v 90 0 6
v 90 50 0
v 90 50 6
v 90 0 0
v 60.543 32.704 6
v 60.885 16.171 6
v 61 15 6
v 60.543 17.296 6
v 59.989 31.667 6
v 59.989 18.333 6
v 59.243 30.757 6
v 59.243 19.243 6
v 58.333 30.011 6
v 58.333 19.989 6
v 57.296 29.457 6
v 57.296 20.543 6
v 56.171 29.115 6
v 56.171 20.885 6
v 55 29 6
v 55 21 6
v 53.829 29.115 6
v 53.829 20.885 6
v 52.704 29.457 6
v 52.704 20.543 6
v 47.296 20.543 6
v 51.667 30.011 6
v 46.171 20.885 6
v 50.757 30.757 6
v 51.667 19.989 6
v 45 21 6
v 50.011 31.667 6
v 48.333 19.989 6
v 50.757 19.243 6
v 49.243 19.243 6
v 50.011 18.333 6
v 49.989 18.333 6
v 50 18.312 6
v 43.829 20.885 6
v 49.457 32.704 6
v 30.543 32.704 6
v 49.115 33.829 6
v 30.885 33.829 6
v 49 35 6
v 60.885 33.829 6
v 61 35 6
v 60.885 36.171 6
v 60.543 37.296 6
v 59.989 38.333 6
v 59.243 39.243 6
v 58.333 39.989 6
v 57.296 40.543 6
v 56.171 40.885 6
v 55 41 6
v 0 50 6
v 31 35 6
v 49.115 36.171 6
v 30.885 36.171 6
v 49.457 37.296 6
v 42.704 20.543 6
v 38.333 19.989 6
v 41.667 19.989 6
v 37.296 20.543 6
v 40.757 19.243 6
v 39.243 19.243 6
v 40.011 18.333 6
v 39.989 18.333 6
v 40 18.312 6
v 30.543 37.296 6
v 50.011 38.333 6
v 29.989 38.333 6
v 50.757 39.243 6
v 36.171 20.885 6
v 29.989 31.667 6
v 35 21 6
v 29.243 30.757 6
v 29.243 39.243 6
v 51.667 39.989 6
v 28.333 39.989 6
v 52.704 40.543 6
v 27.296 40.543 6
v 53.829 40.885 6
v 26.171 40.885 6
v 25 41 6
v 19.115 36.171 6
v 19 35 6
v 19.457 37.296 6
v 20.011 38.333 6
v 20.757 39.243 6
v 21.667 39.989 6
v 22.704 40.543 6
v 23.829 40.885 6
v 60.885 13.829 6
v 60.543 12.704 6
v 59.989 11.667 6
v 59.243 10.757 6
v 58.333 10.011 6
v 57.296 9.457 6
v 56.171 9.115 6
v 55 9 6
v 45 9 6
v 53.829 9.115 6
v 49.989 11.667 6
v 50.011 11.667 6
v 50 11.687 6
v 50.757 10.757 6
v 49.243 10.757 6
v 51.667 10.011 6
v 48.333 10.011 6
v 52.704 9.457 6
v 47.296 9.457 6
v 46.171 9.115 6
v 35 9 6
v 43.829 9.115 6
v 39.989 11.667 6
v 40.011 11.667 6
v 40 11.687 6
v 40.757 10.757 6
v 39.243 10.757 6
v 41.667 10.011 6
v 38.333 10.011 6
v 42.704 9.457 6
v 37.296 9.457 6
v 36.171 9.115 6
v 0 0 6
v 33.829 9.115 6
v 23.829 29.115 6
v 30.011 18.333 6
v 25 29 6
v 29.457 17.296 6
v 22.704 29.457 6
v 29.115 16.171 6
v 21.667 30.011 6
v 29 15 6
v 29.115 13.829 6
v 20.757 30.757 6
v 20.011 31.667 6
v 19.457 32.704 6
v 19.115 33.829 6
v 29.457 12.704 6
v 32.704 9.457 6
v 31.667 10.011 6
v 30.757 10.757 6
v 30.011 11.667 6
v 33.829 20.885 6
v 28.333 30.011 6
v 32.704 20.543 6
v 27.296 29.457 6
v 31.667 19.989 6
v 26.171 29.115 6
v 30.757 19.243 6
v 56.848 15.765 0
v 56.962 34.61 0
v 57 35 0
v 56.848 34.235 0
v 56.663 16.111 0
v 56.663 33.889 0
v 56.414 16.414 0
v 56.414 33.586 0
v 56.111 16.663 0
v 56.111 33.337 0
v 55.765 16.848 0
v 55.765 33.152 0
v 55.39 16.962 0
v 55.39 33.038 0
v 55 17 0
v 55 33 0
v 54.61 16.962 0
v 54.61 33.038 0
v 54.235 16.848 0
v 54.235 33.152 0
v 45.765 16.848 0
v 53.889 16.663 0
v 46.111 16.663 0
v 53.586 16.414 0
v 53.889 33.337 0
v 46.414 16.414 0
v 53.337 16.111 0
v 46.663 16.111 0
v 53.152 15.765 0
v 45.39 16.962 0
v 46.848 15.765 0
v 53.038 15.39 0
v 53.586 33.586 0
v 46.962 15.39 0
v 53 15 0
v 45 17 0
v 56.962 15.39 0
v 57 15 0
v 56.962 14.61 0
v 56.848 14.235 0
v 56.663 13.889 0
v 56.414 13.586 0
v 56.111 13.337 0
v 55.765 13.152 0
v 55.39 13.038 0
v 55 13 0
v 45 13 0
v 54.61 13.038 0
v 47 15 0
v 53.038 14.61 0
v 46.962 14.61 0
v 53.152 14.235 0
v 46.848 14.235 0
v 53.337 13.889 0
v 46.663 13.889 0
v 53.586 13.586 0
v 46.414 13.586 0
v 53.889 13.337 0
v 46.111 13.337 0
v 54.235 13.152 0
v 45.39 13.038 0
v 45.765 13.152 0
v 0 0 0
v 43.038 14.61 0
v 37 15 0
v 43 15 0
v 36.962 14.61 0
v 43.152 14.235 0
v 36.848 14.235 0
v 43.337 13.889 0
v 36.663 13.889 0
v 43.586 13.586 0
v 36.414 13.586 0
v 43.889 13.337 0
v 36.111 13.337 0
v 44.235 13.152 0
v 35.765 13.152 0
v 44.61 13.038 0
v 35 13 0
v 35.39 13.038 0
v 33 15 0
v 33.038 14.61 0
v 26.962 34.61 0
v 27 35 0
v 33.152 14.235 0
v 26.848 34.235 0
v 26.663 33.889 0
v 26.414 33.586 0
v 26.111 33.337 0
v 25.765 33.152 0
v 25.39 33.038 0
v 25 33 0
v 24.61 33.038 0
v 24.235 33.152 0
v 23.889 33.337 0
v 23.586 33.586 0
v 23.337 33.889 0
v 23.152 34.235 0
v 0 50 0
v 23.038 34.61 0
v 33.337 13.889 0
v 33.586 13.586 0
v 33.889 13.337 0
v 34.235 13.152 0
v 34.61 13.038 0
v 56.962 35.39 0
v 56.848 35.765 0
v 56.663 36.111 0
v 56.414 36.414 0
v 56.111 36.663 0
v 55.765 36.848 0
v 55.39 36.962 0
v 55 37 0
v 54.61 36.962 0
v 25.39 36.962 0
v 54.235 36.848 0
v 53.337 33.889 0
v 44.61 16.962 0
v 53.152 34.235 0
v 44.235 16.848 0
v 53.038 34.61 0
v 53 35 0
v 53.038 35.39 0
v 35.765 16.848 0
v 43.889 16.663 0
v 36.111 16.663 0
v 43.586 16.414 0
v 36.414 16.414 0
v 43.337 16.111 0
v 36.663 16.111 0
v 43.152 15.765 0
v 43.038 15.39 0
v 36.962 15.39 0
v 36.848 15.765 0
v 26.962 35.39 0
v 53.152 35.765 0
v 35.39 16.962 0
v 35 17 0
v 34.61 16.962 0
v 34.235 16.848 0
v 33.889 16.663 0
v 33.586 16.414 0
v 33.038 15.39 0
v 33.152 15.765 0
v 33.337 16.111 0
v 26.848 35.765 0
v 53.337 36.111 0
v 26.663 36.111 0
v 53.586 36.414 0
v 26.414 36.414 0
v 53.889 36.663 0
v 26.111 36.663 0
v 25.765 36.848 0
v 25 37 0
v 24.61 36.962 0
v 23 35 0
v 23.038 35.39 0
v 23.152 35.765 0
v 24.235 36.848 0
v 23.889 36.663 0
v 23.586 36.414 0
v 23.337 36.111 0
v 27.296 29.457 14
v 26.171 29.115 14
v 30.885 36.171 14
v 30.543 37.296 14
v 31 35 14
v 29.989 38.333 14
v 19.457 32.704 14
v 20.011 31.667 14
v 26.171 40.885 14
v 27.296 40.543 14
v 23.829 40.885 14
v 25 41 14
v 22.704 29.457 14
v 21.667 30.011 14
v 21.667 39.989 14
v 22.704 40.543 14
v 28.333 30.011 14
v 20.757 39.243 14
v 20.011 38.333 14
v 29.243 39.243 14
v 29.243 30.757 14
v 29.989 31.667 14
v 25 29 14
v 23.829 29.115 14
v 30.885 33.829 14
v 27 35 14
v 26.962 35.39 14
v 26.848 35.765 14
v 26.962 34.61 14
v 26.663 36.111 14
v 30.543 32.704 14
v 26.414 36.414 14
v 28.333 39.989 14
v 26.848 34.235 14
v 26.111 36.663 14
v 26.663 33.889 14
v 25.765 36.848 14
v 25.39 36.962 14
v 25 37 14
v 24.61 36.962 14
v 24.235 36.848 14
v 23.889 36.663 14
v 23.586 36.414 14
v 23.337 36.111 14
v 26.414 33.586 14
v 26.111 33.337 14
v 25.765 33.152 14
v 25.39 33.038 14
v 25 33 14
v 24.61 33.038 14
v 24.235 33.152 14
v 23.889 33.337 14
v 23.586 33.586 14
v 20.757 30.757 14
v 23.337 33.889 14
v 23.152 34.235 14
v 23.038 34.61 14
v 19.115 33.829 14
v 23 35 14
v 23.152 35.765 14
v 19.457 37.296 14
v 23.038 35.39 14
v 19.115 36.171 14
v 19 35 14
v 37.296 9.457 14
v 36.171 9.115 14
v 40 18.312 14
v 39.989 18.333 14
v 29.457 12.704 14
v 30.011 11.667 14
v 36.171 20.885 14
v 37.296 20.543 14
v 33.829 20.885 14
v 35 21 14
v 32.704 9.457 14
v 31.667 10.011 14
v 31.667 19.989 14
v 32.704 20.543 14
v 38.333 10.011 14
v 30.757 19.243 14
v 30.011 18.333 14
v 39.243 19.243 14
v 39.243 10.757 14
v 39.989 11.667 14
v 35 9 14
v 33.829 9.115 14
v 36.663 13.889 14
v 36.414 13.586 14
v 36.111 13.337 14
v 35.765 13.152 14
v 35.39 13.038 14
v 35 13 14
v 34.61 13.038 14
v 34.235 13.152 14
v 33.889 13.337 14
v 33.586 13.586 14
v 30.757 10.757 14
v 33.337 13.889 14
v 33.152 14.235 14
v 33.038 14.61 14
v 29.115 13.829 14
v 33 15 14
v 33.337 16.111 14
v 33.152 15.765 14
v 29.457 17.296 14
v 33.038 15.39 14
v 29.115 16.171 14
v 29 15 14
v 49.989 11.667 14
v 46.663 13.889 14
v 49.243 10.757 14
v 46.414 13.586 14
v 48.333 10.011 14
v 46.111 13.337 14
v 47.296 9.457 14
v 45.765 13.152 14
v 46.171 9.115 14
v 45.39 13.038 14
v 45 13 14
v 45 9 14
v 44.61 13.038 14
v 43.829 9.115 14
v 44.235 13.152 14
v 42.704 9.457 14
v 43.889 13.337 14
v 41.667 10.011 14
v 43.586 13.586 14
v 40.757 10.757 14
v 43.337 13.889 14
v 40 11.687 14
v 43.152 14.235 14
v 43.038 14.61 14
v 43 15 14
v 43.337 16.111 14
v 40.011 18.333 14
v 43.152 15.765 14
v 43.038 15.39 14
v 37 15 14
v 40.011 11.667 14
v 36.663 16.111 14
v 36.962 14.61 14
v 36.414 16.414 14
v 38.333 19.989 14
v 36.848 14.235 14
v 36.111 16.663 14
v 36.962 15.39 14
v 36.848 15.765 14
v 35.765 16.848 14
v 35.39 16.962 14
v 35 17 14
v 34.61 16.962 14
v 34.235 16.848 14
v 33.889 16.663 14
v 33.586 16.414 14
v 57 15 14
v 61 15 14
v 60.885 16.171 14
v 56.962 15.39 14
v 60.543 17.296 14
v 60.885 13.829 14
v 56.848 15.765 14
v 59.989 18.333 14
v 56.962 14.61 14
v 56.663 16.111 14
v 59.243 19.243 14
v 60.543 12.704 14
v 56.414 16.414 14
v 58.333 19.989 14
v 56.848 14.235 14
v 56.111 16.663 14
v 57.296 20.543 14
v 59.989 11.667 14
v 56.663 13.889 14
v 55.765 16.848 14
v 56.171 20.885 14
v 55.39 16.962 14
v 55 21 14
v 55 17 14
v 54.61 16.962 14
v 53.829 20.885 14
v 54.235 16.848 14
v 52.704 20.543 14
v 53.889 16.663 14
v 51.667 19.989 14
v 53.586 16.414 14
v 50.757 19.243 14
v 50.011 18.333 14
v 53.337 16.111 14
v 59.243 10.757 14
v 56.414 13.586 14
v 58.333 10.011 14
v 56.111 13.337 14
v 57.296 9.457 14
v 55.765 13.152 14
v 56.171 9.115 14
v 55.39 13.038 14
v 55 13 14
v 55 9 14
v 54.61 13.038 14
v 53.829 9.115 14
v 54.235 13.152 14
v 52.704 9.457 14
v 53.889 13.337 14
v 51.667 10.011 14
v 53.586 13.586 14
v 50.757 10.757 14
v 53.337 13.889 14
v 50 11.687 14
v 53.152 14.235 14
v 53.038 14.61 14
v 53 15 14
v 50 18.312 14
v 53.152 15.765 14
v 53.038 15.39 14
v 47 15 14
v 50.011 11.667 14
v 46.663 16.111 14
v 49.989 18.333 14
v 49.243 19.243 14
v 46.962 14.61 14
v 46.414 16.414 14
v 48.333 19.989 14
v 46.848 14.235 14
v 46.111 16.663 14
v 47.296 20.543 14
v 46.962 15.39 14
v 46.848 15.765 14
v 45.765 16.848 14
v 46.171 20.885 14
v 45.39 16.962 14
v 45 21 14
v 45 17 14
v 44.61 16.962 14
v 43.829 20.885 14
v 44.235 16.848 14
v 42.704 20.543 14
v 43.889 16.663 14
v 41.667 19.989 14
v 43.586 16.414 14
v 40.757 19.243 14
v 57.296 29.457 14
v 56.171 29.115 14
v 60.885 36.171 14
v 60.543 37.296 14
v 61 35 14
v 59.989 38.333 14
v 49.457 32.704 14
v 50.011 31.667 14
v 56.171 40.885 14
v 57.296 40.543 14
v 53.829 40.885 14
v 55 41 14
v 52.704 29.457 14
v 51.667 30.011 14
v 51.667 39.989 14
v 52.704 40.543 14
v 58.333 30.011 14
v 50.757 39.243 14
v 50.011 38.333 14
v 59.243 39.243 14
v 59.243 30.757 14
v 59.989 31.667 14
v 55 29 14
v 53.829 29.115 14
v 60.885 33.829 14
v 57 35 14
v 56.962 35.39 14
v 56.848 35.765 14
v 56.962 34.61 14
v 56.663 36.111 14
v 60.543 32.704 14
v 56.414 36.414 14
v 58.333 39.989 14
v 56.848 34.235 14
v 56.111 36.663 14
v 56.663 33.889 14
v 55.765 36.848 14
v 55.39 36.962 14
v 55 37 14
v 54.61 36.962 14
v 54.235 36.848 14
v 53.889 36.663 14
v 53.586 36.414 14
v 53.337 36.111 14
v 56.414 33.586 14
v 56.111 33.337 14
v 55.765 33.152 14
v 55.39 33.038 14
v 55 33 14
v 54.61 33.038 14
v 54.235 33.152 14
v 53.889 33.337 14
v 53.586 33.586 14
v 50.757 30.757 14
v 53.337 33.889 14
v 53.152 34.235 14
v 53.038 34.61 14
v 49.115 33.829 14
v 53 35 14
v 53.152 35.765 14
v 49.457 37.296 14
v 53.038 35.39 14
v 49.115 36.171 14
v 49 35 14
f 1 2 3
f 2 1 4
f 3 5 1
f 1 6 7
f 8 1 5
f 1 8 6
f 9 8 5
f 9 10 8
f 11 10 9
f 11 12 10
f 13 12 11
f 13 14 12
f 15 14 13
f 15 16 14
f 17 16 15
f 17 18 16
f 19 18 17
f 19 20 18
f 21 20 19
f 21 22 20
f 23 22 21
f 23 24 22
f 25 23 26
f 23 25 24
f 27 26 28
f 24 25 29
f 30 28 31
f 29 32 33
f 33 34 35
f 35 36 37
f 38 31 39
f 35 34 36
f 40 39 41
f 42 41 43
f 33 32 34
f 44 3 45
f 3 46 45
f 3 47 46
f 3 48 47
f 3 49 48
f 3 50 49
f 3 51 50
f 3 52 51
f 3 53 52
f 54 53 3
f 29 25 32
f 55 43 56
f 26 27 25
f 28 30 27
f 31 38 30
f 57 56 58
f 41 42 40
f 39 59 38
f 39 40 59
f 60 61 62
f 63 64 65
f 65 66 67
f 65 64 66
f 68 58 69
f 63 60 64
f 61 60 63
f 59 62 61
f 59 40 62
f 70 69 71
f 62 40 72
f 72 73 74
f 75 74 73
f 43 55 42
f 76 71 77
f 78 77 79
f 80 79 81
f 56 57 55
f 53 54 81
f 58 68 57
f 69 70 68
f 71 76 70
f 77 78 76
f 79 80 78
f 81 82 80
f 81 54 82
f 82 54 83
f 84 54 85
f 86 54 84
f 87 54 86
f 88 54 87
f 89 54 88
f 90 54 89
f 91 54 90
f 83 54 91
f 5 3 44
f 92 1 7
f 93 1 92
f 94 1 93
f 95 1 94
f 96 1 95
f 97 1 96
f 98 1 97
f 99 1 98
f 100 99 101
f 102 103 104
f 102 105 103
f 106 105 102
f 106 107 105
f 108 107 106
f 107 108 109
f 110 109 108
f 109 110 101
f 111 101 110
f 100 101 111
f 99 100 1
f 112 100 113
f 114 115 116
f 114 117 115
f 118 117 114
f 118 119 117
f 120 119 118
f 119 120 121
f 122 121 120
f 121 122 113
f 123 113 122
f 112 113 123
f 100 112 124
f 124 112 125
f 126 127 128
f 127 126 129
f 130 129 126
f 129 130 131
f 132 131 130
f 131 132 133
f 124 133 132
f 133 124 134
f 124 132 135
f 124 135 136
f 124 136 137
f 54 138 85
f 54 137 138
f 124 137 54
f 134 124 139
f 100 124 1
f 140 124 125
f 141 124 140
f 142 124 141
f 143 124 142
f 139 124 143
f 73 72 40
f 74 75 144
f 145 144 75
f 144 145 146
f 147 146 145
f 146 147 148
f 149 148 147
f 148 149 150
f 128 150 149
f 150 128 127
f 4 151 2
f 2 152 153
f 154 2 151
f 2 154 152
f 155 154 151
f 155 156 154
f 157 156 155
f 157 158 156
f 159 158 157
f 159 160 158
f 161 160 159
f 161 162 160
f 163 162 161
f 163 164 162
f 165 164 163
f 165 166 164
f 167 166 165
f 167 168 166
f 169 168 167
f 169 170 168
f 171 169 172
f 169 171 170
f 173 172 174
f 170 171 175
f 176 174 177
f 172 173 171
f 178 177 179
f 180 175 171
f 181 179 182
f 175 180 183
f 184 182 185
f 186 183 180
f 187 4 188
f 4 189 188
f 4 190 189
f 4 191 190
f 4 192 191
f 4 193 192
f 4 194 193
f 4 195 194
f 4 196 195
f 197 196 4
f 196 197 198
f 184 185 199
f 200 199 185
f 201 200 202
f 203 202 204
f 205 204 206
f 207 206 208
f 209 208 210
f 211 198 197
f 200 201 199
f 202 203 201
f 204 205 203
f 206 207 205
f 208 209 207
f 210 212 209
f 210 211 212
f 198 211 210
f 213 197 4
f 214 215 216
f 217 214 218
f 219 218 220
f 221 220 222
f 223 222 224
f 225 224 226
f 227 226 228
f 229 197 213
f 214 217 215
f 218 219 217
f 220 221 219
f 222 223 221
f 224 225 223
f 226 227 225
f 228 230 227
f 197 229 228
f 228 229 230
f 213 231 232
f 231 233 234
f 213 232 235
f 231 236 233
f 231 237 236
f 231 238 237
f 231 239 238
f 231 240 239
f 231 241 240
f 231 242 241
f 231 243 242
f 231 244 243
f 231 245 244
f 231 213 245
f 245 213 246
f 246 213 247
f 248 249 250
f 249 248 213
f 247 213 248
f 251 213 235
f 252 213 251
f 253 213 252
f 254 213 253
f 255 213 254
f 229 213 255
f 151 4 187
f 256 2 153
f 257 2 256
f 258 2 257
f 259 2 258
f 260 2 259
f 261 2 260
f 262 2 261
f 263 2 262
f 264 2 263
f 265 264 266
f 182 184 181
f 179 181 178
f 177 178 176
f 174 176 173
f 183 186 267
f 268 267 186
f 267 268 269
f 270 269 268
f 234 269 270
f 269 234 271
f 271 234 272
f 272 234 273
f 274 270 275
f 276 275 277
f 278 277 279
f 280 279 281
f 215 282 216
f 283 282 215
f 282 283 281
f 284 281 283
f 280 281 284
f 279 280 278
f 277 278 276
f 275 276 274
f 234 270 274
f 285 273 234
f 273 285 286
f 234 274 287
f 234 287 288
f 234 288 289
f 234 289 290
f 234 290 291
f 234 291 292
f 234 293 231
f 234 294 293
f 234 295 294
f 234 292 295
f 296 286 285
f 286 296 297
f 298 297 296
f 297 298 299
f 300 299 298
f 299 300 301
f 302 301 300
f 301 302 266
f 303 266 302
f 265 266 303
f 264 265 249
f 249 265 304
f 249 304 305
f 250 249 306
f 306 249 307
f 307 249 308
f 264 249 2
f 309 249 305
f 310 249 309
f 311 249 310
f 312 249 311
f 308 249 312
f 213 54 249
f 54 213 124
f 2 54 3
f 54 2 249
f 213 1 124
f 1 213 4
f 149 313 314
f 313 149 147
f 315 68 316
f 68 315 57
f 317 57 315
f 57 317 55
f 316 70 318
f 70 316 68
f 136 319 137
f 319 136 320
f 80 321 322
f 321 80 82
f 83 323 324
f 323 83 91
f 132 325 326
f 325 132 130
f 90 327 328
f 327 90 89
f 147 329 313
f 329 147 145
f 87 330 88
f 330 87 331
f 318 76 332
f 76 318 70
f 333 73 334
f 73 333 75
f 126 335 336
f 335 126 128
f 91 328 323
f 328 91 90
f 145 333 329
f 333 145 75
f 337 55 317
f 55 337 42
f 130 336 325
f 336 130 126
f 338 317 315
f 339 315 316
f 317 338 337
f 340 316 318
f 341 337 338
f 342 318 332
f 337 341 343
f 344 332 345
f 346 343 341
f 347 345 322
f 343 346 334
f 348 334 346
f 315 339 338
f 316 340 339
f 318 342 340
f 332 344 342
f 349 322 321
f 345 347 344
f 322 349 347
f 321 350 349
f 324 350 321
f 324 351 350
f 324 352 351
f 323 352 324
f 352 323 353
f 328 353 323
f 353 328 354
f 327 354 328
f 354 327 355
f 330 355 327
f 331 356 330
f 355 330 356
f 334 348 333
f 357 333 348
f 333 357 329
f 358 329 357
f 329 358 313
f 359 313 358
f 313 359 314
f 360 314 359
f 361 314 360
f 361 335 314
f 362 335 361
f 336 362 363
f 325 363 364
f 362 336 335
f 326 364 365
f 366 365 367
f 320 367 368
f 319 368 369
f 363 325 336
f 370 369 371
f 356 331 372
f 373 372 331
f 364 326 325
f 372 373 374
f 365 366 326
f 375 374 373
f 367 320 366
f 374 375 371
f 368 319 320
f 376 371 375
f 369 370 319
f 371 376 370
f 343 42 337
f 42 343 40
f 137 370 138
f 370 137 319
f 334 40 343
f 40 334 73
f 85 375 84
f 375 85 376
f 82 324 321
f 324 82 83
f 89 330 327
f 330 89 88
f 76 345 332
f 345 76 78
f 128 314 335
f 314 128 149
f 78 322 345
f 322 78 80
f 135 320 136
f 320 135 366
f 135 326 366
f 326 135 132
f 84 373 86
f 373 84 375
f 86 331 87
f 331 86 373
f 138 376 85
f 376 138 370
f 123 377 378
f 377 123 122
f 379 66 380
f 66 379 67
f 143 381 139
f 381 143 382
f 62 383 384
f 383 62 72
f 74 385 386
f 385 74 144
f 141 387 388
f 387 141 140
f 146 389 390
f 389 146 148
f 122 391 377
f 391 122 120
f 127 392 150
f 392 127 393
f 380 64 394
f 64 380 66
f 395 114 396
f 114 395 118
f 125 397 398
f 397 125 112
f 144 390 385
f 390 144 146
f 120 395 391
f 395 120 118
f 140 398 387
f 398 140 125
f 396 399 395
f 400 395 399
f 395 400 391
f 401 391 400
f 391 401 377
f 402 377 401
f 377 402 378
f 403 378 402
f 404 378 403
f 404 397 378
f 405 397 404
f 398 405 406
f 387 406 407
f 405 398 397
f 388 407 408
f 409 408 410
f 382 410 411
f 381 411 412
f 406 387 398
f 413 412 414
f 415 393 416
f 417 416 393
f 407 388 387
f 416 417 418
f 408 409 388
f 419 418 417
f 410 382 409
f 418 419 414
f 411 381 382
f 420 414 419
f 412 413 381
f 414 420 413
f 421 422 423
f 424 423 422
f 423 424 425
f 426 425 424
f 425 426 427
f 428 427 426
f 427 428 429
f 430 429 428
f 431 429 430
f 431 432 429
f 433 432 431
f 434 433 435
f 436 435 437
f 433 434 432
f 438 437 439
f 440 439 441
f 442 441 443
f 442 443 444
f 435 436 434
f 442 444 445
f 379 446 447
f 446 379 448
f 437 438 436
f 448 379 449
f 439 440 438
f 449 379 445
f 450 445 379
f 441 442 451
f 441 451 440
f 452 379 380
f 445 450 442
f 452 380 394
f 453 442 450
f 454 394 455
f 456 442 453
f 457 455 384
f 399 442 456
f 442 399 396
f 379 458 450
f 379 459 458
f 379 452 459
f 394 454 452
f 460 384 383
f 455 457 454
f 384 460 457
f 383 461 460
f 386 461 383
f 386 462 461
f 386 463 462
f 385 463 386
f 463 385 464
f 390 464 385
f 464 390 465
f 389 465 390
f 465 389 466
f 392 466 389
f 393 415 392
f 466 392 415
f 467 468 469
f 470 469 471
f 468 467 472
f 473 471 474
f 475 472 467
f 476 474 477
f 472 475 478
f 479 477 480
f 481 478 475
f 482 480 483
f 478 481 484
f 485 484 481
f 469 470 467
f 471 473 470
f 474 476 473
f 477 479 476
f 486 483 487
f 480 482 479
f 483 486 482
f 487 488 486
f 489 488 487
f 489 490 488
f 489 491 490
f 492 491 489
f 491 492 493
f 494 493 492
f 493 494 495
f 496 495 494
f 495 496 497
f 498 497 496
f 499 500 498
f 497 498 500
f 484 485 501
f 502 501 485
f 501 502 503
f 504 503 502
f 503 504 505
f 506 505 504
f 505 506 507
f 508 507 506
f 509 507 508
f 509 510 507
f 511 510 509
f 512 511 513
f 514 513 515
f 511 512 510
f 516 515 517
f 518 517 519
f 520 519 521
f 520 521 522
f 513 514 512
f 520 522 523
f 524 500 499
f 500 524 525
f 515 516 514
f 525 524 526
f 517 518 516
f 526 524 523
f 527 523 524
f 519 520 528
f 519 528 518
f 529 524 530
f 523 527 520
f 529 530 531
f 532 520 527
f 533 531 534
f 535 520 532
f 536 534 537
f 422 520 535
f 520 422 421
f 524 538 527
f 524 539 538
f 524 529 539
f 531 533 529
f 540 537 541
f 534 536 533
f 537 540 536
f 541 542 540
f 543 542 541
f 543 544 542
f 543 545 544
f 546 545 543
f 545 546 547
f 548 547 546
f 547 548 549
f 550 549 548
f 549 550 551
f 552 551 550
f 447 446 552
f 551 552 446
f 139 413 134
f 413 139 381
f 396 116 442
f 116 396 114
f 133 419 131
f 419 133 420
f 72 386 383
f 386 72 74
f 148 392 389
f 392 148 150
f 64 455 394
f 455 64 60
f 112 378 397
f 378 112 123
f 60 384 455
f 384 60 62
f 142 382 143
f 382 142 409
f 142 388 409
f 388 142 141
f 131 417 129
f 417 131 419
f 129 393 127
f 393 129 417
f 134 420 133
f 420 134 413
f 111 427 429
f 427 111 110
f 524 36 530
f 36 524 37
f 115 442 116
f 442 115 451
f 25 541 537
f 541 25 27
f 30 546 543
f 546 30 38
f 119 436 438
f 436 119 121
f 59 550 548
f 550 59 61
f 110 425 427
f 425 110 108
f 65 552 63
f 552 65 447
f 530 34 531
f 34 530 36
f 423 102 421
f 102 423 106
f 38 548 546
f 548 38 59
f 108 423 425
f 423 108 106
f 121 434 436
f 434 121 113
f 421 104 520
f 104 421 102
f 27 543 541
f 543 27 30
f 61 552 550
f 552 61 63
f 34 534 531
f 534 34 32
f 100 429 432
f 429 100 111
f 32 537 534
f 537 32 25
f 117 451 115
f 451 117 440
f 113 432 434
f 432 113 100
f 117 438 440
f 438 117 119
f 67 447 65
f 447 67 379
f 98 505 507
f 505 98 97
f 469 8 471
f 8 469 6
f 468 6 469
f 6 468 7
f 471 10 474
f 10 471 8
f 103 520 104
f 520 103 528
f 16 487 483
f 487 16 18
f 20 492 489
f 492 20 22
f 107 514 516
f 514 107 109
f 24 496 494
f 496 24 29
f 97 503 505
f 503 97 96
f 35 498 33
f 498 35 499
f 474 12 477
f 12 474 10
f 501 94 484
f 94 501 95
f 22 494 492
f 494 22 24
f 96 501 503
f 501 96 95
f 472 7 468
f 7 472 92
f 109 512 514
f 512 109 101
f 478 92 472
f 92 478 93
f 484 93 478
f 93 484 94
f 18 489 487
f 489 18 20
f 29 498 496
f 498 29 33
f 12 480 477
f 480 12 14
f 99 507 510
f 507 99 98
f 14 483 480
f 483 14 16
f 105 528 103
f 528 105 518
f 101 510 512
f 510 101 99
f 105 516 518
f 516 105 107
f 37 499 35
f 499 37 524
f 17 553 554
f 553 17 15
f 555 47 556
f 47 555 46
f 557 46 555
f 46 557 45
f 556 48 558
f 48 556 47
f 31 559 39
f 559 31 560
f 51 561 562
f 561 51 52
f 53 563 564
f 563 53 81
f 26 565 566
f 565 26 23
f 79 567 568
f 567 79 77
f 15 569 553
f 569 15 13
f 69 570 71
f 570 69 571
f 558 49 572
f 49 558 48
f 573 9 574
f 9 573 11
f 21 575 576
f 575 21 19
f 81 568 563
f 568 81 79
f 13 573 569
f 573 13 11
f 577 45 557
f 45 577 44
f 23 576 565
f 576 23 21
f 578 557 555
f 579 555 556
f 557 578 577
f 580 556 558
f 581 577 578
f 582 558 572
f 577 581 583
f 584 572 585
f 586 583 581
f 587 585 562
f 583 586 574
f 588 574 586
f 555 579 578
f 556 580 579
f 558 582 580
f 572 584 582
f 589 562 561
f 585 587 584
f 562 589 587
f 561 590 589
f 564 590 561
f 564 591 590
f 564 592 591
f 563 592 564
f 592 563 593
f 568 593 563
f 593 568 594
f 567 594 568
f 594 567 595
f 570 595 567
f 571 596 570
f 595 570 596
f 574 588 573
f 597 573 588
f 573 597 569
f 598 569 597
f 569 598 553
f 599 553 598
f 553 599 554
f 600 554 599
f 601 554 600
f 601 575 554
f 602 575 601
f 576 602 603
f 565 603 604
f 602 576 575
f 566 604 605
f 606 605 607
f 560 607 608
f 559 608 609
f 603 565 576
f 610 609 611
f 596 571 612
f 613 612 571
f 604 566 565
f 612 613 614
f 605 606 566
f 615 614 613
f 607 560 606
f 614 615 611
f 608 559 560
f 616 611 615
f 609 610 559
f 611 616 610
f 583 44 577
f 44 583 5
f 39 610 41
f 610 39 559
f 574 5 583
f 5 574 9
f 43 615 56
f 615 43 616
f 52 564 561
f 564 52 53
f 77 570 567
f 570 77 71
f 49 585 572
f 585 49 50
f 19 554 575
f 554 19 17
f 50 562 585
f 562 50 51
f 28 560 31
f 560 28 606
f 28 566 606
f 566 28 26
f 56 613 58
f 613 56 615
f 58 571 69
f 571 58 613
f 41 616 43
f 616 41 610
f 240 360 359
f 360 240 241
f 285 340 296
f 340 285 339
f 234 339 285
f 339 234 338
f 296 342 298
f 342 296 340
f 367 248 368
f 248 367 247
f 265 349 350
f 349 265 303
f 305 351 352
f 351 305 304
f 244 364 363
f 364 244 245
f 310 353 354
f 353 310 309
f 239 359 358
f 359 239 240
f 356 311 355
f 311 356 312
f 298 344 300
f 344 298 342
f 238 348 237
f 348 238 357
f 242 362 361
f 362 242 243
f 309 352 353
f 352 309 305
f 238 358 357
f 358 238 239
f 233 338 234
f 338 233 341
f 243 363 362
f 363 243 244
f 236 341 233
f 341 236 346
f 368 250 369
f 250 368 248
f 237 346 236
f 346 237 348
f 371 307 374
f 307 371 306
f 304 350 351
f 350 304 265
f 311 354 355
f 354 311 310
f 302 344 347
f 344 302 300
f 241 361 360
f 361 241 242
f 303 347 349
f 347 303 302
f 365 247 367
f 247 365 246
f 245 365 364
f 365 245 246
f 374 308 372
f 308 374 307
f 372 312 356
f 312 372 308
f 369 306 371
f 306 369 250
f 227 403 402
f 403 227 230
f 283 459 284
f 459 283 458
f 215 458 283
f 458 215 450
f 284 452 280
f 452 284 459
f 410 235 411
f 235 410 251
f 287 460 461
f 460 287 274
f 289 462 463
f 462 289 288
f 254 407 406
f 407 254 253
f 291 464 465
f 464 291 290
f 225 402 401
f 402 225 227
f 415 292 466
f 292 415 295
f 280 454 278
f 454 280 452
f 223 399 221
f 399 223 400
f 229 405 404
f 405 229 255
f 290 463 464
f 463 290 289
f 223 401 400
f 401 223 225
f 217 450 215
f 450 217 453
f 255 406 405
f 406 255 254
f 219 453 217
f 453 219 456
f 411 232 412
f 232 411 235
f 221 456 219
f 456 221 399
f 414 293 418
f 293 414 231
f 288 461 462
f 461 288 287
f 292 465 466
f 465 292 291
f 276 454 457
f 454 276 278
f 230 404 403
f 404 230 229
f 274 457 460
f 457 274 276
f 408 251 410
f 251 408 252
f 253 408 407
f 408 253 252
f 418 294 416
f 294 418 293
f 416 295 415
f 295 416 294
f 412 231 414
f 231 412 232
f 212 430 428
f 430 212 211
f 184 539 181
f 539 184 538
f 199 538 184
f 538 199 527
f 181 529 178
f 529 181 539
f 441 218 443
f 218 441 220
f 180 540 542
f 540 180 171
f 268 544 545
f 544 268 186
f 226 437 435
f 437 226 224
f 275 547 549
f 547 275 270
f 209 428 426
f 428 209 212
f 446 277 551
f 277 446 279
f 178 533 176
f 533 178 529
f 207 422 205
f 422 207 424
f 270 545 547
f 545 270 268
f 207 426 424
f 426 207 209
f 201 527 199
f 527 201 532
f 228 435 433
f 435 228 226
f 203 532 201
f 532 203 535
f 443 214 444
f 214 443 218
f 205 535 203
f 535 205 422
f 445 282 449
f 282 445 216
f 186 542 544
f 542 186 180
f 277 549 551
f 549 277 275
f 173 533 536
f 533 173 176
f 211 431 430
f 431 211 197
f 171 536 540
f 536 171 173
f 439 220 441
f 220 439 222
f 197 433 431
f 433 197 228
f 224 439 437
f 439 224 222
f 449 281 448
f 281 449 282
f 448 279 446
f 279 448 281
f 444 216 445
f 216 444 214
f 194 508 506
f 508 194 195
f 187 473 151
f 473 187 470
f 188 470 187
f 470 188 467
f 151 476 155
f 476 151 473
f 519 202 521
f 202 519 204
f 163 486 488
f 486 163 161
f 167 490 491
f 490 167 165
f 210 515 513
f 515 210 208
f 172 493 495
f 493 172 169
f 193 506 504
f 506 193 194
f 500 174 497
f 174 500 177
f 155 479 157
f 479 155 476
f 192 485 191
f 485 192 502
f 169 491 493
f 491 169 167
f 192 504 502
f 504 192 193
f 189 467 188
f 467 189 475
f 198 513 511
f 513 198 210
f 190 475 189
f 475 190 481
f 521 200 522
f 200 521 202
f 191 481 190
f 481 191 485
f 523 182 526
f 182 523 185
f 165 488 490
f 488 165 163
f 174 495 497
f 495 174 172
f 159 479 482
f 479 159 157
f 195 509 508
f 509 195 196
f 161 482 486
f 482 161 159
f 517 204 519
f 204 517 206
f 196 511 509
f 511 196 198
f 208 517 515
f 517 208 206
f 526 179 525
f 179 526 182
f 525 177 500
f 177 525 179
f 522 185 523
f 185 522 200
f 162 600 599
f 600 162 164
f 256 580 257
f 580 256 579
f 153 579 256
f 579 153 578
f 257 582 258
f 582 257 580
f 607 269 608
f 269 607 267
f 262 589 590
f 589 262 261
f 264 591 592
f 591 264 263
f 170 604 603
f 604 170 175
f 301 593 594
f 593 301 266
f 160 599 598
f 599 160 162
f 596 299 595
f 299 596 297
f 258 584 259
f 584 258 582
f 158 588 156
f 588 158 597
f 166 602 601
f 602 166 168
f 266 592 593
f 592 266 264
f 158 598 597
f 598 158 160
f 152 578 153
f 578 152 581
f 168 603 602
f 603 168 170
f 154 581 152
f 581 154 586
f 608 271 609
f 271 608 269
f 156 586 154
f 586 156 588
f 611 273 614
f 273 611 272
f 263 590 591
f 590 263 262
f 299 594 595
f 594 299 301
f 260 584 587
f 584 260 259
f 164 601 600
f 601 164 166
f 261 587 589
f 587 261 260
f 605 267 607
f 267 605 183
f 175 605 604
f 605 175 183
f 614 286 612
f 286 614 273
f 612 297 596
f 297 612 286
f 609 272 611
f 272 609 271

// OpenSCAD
$fn = 32;

// ----------------------------------------------------------------------
// Boss field: plate with bosses at given coordinates
// ----------------------------------------------------------------------

// --- parameters (mm) ---
plate_l = 90;             // plate length, X
plate_w = 50;             // plate width, Y
plate_t = 6;              // plate thickness, Z
boss_d = 12;              // boss diameter
boss_h = 8;               // boss height above the plate
bore_d = 4;               // boss bore

total_h = plate_t + boss_h;  // overall height

difference() {
  union() {
    cube([plate_l, plate_w, plate_t]);
    translate([25, 35, plate_t]) cylinder(h = boss_h, d = boss_d);
    translate([35, 15, plate_t]) cylinder(h = boss_h, d = boss_d);
    translate([45, 15, plate_t]) cylinder(h = boss_h, d = boss_d);
    translate([55, 15, plate_t]) cylinder(h = boss_h, d = boss_d);
    translate([55, 35, plate_t]) cylinder(h = boss_h, d = boss_d);
  }
  translate([25, 35, -1]) cylinder(h = total_h + 2, d = bore_d);
  translate([35, 15, -1]) cylinder(h = total_h + 2, d = bore_d);
  translate([45, 15, -1]) cylinder(h = total_h + 2, d = bore_d);
  translate([55, 15, -1]) cylinder(h = total_h + 2, d = bore_d);
  translate([55, 35, -1]) cylinder(h = total_h + 2, d = bore_d);
}
